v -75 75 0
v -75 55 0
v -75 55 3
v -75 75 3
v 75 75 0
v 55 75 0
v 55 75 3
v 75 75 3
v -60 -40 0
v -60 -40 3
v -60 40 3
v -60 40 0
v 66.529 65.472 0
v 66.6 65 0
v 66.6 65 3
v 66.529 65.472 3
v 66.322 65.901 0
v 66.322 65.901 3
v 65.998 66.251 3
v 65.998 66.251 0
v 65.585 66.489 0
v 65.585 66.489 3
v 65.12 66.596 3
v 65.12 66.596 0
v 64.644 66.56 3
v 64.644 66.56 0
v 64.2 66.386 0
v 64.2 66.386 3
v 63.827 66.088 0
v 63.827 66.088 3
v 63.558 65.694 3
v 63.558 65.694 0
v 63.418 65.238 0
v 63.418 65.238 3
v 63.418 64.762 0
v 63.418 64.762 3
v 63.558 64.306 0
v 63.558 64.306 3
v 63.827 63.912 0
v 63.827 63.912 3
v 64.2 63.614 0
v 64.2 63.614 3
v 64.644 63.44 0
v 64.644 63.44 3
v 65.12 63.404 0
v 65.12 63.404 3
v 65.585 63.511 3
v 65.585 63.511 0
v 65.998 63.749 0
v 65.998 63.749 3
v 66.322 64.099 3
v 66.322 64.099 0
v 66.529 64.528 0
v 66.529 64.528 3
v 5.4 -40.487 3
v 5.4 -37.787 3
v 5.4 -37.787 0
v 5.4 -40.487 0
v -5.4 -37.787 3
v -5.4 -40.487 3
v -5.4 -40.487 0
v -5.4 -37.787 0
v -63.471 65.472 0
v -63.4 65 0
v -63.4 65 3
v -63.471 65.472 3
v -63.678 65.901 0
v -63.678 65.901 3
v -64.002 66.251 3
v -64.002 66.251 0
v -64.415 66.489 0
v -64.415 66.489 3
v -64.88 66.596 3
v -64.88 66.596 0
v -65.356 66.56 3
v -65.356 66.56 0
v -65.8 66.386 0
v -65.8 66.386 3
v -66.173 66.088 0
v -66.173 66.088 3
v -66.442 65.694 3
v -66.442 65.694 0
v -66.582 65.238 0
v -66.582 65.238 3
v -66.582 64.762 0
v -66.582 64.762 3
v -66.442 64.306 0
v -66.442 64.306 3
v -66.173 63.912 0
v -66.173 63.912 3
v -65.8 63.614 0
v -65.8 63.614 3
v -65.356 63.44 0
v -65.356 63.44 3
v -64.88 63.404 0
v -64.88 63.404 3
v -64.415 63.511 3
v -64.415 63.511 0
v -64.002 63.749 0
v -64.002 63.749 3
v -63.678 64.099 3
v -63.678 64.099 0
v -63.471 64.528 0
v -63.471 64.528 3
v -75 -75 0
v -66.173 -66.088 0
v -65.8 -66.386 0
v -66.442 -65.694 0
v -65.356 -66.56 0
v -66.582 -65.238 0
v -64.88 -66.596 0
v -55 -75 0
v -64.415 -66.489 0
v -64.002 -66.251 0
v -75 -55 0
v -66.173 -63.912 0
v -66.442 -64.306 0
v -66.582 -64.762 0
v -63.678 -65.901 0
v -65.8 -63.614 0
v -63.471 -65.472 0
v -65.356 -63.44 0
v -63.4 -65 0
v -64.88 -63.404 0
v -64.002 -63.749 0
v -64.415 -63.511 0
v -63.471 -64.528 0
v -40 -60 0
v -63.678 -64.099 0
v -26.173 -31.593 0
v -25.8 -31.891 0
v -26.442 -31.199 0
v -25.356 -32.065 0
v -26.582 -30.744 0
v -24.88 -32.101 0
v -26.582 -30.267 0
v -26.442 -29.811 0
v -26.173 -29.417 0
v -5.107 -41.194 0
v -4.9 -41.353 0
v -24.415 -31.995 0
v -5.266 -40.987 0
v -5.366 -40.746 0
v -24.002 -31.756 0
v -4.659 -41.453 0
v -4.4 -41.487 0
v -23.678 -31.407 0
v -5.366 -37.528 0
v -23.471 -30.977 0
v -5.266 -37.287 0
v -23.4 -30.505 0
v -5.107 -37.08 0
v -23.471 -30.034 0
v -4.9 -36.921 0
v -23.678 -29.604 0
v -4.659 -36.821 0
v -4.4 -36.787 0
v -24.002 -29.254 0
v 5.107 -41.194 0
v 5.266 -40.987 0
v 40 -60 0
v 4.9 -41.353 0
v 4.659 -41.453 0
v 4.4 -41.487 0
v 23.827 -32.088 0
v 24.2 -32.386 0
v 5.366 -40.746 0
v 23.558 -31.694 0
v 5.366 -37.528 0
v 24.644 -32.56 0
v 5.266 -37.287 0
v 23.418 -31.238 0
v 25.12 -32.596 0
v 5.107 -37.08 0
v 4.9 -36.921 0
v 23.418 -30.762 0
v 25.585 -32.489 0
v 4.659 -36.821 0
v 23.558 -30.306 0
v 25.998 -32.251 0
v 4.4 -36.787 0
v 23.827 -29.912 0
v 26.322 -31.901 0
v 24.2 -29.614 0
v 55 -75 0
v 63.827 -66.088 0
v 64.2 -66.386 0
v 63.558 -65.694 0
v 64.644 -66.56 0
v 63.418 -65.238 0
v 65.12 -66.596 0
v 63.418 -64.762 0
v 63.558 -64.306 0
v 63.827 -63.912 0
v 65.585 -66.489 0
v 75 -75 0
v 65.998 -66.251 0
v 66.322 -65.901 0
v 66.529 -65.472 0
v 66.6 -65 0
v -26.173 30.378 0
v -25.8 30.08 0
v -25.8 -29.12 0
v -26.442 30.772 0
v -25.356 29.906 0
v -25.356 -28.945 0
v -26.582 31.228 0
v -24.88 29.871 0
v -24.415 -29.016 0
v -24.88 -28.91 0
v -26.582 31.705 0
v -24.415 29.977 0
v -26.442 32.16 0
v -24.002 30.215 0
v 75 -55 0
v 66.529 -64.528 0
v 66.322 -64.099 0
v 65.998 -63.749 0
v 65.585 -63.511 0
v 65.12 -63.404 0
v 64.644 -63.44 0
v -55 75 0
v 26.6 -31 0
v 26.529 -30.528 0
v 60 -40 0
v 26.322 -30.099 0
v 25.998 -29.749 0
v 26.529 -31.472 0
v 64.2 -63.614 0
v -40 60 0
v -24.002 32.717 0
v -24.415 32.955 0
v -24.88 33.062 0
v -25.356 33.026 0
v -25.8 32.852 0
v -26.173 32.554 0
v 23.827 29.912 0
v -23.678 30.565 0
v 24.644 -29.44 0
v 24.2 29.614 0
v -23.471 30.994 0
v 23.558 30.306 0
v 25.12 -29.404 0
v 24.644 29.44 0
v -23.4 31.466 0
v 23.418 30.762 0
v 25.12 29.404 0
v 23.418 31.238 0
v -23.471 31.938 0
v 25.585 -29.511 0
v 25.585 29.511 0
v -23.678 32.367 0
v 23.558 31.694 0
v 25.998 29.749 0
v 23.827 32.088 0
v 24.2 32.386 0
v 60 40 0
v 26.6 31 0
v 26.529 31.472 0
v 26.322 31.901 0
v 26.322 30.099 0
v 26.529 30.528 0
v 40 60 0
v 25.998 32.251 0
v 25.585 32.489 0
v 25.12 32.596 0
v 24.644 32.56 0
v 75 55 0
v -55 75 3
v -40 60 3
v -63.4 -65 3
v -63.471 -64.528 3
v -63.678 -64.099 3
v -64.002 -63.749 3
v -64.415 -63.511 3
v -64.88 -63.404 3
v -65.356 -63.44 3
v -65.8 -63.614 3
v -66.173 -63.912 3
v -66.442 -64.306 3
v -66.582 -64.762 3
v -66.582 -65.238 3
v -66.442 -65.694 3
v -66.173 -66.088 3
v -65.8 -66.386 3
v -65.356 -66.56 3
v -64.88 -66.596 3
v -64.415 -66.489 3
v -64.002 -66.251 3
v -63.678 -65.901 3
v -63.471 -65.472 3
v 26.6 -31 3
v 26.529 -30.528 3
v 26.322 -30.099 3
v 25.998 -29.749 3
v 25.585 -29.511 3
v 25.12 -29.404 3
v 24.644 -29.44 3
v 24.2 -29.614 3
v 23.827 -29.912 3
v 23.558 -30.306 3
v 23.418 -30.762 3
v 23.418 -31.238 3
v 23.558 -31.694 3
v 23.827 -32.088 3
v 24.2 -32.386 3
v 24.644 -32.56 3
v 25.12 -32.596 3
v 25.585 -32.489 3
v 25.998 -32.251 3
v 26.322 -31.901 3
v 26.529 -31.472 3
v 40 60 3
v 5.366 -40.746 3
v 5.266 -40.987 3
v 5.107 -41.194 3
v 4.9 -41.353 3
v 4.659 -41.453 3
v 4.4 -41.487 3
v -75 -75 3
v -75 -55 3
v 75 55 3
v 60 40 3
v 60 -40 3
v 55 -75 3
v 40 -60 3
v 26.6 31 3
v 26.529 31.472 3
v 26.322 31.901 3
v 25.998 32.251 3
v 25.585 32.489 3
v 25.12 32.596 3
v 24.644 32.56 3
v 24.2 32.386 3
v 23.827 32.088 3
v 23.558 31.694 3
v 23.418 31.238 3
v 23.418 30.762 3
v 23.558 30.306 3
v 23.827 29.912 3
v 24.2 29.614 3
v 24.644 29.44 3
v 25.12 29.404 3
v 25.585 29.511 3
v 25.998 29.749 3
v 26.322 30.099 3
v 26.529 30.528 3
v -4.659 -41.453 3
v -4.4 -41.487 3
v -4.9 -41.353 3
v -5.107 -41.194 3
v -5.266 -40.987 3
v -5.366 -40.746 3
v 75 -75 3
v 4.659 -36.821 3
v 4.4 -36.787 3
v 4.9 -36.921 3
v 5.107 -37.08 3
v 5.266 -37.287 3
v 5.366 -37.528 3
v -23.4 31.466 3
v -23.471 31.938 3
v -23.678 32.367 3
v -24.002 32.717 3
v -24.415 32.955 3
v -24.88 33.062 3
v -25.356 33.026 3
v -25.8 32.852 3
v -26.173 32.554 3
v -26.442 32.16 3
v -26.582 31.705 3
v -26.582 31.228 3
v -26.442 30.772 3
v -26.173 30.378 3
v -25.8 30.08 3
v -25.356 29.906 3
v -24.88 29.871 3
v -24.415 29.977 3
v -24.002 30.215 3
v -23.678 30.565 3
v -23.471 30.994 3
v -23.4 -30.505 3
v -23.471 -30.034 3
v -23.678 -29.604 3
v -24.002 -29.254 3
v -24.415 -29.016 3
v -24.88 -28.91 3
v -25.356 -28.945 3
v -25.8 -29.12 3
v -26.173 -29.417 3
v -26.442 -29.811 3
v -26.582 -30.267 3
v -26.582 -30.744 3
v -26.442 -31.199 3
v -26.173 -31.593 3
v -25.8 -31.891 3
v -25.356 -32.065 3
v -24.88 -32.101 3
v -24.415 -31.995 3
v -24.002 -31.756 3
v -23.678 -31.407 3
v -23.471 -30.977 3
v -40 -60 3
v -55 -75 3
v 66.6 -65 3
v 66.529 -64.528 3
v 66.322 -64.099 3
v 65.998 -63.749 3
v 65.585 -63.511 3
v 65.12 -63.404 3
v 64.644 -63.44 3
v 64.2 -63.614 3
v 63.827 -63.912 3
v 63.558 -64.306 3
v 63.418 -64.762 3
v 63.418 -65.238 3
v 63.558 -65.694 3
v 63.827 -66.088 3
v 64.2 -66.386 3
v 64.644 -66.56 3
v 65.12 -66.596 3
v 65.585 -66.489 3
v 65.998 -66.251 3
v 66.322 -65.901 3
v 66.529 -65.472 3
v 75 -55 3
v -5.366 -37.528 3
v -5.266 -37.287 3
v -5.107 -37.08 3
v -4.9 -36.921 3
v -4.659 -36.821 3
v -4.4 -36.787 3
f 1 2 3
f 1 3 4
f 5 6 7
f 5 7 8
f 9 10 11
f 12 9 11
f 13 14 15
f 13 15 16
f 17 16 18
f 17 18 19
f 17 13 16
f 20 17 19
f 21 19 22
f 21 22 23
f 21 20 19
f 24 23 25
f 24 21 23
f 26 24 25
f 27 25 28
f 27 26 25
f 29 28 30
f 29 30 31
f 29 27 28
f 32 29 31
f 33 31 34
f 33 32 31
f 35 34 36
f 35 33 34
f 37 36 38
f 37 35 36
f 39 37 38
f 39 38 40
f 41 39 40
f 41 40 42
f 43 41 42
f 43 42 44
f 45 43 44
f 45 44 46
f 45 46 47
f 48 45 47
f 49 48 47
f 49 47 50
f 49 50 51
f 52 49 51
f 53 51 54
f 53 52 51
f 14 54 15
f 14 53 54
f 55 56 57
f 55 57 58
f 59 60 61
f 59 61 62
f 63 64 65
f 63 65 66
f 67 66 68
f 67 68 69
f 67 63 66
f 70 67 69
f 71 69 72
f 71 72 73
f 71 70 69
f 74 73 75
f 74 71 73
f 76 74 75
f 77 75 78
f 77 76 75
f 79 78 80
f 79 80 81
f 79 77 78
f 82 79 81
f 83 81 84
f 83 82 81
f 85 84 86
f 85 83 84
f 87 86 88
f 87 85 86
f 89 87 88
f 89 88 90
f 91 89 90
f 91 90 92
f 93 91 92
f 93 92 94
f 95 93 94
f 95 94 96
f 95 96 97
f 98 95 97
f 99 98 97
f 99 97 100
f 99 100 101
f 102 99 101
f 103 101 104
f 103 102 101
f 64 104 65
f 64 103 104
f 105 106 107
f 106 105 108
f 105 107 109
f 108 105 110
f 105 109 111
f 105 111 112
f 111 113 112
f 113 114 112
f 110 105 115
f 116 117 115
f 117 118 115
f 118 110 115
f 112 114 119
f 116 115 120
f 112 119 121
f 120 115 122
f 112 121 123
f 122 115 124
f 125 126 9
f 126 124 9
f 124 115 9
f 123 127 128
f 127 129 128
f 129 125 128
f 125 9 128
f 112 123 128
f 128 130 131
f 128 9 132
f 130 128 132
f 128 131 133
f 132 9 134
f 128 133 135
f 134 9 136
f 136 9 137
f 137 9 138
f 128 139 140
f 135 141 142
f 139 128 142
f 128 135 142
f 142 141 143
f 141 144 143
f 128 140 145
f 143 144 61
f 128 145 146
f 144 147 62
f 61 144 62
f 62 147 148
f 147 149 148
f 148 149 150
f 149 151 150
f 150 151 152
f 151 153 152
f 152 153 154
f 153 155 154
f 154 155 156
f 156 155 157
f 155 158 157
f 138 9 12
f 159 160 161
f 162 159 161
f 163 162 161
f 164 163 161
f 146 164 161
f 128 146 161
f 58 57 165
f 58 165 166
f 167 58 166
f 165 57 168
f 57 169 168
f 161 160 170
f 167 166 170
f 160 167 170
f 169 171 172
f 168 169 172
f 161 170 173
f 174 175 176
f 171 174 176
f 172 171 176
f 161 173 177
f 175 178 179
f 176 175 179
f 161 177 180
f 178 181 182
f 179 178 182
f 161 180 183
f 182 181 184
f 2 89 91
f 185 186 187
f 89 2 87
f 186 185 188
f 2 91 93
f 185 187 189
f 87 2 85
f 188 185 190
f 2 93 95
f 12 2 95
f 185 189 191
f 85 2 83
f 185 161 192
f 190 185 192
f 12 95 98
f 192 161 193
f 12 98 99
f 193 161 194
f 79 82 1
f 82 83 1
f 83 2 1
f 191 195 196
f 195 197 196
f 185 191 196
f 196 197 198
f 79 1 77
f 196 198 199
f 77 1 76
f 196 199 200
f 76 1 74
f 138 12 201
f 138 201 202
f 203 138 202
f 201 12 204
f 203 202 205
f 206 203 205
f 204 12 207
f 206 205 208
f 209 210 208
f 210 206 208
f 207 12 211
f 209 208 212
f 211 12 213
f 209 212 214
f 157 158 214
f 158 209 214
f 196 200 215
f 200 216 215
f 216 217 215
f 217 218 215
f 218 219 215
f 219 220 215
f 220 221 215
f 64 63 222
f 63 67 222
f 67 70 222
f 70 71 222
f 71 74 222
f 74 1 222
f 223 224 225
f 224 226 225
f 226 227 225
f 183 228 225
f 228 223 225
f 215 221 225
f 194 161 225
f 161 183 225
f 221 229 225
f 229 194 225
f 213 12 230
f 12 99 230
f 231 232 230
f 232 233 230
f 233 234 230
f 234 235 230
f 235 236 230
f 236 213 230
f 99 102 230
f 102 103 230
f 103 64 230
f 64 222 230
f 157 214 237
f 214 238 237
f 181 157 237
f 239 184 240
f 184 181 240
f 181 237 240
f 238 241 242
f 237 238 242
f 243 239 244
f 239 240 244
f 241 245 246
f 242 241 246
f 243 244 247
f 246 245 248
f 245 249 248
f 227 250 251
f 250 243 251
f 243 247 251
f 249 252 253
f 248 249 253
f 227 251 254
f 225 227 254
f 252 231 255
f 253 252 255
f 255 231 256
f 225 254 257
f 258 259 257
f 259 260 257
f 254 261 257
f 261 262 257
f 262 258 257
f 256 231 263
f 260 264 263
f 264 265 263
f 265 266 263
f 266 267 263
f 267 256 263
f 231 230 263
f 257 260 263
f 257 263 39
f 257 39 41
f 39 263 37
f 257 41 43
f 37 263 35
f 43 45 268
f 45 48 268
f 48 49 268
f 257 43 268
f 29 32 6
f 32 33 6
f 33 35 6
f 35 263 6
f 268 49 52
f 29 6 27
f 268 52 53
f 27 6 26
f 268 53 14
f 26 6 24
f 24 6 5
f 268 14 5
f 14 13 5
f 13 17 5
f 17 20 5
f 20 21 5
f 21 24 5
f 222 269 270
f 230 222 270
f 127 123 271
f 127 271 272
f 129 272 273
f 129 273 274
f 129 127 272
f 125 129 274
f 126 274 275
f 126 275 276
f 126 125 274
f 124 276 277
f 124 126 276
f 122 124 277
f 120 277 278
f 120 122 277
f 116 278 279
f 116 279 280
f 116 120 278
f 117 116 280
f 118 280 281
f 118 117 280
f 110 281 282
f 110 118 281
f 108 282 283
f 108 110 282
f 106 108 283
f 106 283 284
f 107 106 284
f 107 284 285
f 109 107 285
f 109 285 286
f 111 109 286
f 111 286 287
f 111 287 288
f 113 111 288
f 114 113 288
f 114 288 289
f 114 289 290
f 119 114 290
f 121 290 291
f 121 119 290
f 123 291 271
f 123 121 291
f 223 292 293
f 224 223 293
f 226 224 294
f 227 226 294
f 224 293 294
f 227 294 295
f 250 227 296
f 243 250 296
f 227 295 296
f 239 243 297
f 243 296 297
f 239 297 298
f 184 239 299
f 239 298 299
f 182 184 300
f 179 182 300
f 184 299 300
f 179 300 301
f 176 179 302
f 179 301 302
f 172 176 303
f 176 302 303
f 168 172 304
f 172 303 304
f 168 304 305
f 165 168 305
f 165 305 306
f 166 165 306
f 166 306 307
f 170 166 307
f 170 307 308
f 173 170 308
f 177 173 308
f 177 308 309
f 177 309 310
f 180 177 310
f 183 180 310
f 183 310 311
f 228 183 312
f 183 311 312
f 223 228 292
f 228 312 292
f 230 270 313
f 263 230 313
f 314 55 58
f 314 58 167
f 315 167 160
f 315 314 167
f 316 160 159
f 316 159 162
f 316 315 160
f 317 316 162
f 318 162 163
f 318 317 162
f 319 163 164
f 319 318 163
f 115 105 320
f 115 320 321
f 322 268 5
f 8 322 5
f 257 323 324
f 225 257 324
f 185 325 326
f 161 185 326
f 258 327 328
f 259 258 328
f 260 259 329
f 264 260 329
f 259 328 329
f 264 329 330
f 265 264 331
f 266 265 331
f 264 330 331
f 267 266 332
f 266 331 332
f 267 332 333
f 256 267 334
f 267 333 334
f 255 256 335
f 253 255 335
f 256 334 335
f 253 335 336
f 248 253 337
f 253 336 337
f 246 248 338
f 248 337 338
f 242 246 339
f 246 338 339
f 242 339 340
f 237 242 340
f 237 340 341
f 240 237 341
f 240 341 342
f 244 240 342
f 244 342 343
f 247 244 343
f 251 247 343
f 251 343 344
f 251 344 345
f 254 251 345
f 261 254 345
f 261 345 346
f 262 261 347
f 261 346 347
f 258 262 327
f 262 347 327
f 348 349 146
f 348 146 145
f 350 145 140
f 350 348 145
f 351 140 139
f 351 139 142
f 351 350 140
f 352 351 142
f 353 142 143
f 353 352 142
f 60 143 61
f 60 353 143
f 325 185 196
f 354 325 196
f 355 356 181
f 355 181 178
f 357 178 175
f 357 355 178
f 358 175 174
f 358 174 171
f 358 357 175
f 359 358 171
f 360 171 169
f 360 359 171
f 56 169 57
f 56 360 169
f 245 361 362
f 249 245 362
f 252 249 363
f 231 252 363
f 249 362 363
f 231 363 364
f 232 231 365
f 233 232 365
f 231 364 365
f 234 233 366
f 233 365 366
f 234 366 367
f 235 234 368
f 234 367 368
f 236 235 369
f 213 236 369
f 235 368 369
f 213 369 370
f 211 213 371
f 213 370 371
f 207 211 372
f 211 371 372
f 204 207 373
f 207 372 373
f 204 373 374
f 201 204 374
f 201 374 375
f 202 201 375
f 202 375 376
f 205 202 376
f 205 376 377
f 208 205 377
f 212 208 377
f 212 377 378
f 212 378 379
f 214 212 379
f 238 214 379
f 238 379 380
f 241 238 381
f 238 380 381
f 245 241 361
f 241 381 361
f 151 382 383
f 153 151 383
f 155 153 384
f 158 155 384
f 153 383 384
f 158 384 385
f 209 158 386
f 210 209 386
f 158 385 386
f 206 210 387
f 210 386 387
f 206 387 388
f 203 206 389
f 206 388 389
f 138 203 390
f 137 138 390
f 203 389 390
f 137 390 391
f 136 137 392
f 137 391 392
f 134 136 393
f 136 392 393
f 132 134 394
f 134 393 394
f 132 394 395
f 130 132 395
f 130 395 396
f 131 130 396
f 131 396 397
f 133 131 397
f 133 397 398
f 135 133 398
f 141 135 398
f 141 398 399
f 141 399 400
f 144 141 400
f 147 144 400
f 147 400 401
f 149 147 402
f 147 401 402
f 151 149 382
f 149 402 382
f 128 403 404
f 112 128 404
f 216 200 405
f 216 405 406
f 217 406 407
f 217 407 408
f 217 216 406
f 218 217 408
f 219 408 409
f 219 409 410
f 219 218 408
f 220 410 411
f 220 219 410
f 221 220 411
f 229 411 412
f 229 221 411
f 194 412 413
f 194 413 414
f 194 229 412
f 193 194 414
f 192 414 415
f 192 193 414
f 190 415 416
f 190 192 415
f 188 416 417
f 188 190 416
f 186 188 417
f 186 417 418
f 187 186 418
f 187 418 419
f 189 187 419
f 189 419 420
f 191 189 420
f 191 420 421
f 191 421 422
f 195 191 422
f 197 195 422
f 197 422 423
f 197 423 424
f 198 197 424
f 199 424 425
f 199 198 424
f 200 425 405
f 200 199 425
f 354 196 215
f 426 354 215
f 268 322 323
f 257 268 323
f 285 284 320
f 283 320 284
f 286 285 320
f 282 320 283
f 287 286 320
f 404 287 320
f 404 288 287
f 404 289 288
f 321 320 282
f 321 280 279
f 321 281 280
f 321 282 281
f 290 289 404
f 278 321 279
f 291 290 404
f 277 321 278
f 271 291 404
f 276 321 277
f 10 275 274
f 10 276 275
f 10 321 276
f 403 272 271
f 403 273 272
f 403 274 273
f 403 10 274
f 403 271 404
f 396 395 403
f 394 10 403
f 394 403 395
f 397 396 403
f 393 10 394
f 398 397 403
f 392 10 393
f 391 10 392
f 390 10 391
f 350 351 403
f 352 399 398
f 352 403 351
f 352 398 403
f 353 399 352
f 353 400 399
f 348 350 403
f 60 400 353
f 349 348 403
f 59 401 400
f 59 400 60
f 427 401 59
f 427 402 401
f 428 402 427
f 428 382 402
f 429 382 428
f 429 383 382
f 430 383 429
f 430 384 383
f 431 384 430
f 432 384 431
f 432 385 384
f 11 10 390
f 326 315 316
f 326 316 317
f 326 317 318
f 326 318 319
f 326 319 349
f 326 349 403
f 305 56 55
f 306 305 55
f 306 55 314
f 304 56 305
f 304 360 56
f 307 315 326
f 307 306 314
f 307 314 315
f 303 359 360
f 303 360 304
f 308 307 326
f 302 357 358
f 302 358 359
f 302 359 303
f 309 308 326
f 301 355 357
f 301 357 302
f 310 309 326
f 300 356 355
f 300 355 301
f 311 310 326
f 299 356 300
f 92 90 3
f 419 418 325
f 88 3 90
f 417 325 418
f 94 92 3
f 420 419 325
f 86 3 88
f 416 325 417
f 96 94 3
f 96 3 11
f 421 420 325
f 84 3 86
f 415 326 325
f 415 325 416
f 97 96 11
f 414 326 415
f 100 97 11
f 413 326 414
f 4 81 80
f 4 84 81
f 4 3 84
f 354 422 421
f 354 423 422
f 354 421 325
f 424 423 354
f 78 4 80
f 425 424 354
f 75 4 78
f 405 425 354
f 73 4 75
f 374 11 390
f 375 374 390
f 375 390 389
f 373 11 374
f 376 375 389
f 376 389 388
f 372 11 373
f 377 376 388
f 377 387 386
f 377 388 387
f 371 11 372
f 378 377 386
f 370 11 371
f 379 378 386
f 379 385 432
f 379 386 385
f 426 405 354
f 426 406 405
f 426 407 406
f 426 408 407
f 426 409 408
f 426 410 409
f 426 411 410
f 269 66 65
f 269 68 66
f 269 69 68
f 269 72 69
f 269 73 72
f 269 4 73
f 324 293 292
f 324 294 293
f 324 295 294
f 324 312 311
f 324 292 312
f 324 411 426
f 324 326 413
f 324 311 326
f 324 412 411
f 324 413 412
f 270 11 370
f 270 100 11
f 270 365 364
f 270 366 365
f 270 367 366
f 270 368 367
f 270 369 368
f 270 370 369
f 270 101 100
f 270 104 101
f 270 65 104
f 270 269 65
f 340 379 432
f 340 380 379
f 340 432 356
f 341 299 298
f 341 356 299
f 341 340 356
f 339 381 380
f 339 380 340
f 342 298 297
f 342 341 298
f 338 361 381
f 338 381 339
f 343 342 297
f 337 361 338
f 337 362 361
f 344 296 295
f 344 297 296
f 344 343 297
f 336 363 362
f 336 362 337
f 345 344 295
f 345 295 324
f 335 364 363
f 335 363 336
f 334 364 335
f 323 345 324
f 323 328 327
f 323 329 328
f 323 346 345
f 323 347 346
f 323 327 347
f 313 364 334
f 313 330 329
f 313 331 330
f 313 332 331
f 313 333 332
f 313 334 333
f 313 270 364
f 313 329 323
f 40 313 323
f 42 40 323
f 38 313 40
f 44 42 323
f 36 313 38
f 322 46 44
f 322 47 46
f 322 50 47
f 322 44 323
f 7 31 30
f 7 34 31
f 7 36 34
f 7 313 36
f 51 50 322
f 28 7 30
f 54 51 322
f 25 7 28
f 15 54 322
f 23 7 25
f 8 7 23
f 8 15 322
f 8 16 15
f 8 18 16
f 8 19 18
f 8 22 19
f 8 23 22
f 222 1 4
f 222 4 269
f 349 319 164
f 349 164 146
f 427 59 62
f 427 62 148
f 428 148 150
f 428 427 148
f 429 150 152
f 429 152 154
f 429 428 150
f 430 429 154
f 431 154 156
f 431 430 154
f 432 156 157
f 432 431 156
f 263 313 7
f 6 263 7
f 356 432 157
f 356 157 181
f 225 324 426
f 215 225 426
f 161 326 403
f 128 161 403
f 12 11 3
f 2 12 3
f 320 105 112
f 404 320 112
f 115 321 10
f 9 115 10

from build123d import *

# Parameters (mm, degrees)
SKETCH_1_W          = 150
SKETCH_1_H          = 150
SKETCH_1_R          = 1.6
EXTRUDE_1_DEPTH     = 3
SKETCH_2_R          = 1.6
CUT_EXTRUDE_1_DEPTH = 3
CUT_EXTRUDE_2_DEPTH = 3


with BuildPart() as part:
    # 草图1 → 凸台-拉伸1 (new body)
    with BuildSketch(Plane.XY):
        Rectangle(SKETCH_1_W, SKETCH_1_H)
        with Locations((-65, 65)):
            Circle(SKETCH_1_R, mode=Mode.SUBTRACT)
        with Locations((65, 65)):
            Circle(SKETCH_1_R, mode=Mode.SUBTRACT)
        with Locations((-65, -65)):
            Circle(SKETCH_1_R, mode=Mode.SUBTRACT)
        with Locations((65, -65)):
            Circle(SKETCH_1_R, mode=Mode.SUBTRACT)
    extrude(amount=EXTRUDE_1_DEPTH)

    # 草图2 → 切除-拉伸1 (cut)
    with BuildSketch(Plane.XY.offset(3)):
        with Locations((-25, -30.505222727)):
            Circle(SKETCH_2_R)
        with Locations((25, -31)):
            Circle(SKETCH_2_R)
        with Locations((25, 31)):
            Circle(SKETCH_2_R)
        with Locations((-25, 31.466039431)):
            Circle(SKETCH_2_R)
        Polygon((75, -55), (75, 55), (60, 40), (60, -40), align=None)
        Polygon((-55, 75), (-40, 60), (40, 60), (55, 75), align=None)
        Polygon((-75, -55), (-60, -40), (-60, 40), (-75, 55), align=None)
        Polygon((-55, -75), (55, -75), (40, -60), (-40, -60), align=None)
    extrude(amount=-CUT_EXTRUDE_1_DEPTH, mode=Mode.SUBTRACT)

    # 草图3 → 切除-拉伸2 (cut)
    with BuildSketch(Plane.XY.offset(3)):
        with BuildLine():
            Line((-5.4, -40.487301924), (-5.4, -37.787301924))
            ThreePointArc((-5.4, -37.787301924), (-5.107106781, -37.080195143), (-4.4, -36.787301924))
            Line((-4.4, -36.787301924), (4.4, -36.787301924))
            ThreePointArc((4.4, -36.787301924), (5.107106781, -37.080195143), (5.4, -37.787301924))
            Line((5.4, -37.787301924), (5.4, -40.487301924))
            ThreePointArc((5.4, -40.487301924), (5.107106781, -41.194408705), (4.4, -41.487301924))
            Line((4.4, -41.487301924), (-4.4, -41.487301924))
            ThreePointArc((-4.4, -41.487301924), (-5.107106781, -41.194408705), (-5.4, -40.487301924))
        make_face()
    extrude(amount=-CUT_EXTRUDE_2_DEPTH, mode=Mode.SUBTRACT)


solid = part.part
